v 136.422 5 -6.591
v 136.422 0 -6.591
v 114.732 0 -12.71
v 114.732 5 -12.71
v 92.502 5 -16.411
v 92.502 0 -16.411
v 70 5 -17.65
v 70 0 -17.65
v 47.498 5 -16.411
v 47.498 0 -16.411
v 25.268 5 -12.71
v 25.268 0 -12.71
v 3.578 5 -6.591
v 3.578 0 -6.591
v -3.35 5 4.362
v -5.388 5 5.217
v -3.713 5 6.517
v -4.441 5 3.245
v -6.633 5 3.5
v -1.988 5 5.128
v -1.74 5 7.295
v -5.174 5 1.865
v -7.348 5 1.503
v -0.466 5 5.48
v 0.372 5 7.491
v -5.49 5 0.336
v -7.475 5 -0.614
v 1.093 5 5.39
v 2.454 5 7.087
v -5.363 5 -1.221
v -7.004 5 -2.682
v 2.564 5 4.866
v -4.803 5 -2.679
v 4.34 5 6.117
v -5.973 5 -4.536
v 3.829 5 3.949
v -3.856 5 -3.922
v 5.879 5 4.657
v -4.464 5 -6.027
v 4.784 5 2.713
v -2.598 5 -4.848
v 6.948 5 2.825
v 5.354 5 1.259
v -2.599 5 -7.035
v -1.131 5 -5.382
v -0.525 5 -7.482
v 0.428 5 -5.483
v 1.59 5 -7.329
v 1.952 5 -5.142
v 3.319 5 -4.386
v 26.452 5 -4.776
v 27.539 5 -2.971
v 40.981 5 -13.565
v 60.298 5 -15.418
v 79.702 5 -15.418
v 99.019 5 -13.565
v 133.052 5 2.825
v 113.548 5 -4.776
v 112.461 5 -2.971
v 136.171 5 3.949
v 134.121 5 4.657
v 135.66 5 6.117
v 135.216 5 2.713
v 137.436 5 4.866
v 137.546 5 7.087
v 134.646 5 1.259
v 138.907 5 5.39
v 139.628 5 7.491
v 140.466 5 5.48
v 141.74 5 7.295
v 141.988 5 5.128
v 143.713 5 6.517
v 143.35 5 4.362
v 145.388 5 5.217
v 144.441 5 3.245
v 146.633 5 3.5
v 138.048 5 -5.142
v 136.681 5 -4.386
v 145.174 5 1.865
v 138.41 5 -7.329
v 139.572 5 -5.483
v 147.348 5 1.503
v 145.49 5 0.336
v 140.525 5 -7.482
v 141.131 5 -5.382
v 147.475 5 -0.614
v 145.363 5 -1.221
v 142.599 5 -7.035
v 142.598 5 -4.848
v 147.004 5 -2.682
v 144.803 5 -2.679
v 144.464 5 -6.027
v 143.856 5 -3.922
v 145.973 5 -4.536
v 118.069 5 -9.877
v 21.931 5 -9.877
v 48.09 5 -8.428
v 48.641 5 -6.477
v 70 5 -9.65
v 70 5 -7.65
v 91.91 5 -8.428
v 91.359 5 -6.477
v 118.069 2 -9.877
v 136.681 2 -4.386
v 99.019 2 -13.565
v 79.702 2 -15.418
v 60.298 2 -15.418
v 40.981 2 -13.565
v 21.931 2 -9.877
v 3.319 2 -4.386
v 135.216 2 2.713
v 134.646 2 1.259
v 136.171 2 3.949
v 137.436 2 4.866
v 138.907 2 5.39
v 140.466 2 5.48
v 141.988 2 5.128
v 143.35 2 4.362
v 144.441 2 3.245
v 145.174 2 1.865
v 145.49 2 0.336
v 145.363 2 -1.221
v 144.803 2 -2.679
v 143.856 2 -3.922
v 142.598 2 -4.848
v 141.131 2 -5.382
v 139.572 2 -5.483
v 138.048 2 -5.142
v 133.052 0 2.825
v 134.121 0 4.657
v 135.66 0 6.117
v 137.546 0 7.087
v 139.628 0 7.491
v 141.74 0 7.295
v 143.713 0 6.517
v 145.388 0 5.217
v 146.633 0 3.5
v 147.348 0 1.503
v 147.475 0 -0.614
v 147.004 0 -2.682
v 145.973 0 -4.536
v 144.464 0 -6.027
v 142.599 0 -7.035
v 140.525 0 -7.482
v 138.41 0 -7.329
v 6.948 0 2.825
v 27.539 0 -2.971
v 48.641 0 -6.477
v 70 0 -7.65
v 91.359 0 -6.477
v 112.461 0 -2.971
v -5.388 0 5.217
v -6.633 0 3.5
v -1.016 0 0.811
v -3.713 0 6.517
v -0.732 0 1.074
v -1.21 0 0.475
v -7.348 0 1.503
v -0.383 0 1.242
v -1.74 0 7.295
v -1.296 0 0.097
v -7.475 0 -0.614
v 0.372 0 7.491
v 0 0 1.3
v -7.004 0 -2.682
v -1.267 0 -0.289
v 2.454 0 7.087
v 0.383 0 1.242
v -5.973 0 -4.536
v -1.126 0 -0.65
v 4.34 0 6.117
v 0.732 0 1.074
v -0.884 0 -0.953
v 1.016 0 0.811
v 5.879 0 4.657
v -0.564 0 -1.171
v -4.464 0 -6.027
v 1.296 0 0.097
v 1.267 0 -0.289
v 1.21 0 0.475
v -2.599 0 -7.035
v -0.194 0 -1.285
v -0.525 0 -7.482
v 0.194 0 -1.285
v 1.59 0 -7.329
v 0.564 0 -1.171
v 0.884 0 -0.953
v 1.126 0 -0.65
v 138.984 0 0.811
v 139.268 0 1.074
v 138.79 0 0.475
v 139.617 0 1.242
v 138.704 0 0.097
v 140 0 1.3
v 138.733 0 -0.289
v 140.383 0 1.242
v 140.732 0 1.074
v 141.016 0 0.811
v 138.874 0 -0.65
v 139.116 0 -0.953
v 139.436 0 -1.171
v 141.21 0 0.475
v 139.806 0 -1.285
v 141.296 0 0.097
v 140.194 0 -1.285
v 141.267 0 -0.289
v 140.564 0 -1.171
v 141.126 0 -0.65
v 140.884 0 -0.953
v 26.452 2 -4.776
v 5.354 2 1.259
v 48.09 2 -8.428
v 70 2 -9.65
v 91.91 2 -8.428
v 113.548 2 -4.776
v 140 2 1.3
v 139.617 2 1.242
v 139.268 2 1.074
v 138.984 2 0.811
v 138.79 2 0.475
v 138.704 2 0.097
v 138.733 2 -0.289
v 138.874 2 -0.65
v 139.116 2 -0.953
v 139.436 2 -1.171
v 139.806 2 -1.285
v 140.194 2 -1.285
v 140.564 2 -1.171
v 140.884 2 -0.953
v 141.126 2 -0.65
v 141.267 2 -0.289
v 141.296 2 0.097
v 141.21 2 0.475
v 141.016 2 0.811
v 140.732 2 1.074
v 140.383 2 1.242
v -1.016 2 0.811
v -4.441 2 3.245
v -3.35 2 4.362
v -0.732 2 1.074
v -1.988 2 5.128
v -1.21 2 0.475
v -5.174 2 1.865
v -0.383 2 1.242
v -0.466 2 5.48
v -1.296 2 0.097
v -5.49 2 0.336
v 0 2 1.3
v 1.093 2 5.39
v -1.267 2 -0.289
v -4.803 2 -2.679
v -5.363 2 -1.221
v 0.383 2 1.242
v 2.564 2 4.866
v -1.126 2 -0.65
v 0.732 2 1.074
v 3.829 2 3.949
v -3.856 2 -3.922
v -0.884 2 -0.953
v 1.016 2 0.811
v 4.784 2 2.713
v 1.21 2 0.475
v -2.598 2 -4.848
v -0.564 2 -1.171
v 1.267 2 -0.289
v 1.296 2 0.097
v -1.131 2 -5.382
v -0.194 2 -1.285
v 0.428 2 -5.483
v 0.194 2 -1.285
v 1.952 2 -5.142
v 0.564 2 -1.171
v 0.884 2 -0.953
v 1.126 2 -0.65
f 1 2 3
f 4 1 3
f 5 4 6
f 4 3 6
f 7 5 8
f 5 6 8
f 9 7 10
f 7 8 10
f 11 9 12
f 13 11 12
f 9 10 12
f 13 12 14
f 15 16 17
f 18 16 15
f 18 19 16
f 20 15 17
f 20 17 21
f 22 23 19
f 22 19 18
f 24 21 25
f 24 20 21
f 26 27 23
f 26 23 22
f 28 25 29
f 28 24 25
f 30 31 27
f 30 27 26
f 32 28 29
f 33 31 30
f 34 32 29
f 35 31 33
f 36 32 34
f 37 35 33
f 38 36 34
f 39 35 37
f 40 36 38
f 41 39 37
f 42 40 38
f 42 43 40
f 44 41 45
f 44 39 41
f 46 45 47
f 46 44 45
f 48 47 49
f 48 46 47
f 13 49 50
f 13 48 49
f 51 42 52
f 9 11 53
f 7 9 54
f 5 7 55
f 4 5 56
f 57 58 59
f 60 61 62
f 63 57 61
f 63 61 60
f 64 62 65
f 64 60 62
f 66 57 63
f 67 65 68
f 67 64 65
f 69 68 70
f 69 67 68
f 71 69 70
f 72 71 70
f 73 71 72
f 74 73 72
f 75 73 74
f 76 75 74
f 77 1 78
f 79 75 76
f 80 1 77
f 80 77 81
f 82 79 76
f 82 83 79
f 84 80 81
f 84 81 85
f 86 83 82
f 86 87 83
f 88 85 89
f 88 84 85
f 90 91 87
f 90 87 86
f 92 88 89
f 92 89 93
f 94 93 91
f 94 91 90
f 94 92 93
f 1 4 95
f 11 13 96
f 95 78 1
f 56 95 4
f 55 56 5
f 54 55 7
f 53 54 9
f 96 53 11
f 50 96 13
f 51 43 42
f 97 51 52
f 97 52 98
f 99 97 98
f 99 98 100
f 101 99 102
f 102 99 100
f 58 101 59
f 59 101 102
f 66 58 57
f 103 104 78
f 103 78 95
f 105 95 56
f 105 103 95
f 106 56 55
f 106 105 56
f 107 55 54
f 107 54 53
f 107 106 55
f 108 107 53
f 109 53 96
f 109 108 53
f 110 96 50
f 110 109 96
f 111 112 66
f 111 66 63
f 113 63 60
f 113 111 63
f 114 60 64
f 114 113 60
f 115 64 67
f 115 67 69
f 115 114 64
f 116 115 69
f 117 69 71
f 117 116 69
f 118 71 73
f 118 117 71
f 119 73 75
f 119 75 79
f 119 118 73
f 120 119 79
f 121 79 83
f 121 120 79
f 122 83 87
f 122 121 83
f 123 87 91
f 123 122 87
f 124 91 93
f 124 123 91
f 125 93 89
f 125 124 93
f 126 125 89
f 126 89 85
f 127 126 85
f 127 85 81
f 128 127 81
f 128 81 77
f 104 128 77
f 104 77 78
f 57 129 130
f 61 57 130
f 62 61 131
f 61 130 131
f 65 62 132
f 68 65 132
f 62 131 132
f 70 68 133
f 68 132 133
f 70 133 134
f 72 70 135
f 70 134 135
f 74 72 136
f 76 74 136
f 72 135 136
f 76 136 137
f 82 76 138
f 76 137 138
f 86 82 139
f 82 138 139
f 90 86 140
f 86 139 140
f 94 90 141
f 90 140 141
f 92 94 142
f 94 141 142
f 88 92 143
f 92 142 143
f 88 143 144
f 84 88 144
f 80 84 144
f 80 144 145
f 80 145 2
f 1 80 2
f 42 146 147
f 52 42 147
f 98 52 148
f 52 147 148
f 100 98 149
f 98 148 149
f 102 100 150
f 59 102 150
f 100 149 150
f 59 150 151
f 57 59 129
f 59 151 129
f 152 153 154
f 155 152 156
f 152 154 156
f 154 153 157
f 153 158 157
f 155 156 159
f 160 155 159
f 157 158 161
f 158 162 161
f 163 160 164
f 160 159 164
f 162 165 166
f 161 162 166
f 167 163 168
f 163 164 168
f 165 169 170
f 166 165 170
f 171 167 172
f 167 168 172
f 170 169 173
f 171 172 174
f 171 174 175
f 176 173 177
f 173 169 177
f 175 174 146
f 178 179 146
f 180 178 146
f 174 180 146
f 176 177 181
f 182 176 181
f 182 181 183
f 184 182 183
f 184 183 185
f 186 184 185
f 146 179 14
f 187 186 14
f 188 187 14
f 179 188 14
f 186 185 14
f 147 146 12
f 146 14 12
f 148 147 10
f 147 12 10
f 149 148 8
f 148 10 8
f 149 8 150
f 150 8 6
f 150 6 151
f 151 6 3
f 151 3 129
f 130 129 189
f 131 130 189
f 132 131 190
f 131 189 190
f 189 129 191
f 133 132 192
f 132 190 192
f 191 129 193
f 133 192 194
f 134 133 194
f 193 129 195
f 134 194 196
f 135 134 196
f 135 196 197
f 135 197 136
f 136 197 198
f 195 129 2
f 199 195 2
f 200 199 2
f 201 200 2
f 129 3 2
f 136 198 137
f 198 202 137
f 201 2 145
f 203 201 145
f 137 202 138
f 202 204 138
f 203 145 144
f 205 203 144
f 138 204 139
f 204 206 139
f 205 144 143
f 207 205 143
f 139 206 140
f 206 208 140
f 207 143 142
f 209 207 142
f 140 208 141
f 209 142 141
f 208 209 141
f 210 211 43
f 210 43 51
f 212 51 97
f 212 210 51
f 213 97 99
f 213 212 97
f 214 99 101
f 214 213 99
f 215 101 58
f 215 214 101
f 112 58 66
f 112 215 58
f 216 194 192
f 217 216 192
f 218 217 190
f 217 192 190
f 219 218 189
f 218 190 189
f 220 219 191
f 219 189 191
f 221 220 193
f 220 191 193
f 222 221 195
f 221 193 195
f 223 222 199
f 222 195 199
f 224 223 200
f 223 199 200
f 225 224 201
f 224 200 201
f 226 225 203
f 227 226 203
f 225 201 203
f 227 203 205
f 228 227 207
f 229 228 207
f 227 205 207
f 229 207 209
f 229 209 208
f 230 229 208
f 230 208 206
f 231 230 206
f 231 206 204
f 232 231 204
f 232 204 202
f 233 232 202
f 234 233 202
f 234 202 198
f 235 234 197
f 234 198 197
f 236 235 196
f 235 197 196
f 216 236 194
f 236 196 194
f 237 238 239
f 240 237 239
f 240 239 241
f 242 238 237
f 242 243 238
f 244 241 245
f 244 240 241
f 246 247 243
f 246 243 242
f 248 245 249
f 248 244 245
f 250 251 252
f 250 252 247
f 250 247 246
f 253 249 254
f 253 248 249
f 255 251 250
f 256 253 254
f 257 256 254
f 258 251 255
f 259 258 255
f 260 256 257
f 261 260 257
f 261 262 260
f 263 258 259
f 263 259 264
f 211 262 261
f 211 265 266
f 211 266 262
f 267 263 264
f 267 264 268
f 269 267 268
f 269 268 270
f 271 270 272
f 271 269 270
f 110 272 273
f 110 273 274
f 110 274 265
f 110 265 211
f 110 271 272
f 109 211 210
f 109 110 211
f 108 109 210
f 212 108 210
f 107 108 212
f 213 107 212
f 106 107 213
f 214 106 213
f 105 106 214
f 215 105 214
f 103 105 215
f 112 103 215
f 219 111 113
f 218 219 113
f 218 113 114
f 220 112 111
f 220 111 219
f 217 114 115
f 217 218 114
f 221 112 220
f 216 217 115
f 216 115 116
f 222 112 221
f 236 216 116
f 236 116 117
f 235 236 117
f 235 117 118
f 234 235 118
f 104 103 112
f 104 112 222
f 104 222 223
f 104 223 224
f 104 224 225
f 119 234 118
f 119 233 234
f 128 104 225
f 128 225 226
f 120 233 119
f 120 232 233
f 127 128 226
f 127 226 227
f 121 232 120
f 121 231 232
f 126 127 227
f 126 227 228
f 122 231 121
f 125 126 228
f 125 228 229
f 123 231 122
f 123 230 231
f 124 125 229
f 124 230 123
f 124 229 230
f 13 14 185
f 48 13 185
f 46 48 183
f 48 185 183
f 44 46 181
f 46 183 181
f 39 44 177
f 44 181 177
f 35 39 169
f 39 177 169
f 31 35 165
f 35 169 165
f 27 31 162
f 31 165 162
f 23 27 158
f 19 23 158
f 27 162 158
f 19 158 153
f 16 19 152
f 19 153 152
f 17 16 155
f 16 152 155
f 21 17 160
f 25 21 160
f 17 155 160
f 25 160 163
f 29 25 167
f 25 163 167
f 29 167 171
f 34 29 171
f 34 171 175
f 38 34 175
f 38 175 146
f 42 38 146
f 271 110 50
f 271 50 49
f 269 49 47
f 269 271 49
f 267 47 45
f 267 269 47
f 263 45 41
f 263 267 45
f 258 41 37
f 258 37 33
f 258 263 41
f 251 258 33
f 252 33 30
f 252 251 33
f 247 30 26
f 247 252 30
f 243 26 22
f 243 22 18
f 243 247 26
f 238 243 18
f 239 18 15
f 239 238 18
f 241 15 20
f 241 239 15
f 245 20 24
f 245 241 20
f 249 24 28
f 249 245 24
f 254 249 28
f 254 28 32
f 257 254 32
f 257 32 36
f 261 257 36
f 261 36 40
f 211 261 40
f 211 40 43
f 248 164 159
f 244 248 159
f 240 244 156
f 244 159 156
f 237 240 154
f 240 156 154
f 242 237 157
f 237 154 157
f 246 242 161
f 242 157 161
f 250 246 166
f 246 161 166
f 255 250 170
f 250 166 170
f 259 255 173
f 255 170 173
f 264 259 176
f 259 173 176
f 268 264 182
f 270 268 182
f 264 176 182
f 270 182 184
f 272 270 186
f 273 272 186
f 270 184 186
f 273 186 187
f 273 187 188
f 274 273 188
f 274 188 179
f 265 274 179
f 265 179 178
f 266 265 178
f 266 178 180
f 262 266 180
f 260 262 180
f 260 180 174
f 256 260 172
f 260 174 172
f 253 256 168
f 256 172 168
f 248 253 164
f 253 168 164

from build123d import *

# Parameters (mm, degrees)
DODANIE_WYCI_GNI_CIE2_DEPTH  = 5
SKORUPA2_START               = 2
SKORUPA2_DEPTH               = 3
SZKIC5_W                     = 1.3
SZKIC5_H                     = 2.001
OTW_R_POD_RUB_M22_AT_2_COUNT = 2
OTW_R_POD_RUB_M22_AT_2_PITCH = 140


# Read off the part's stored shape, not the designer's step: Skorupa2
with BuildPart() as part:
    # Szkic4 → Dodanie-wyciągnięcie2 (new body)
    with BuildSketch(Plane(origin=(0, 0, 0), x_dir=(1, 0, 0), z_dir=(0, 1, 0))):
        with BuildLine():
            ThreePointArc((3.578481933, 6.591241693), (-7.061624869, -2.526549863), (6.947544161, -2.825177894))
            ThreePointArc((6.947544161, -2.825177894), (70, 7.650060048), (133.052455839, -2.825177894))
            ThreePointArc((133.052455839, -2.825177894), (147.061624869, -2.526549863), (136.421518067, 6.591241693))
            ThreePointArc((136.421518067, 6.591241693), (70, 17.650060048), (3.578481933, 6.591241693))
        make_face()
    extrude(amount=DODANIE_WYCI_GNI_CIE2_DEPTH)

    # Skorupa2 outline → Skorupa2 (cut)
    with BuildSketch(Plane(origin=(0, 0, 0), x_dir=(1, 0, 0), z_dir=(0, 1, 0)).offset(SKORUPA2_START)):
        with BuildLine():
            ThreePointArc((3.318777837, 4.385853813), (-5.173966338, -1.865495198), (5.353998671, -1.258847978))
            ThreePointArc((5.353998671, -1.258847978), (70, 9.650060048), (134.646001329, -1.258847978))
            ThreePointArc((134.646001329, -1.258847978), (145.173966338, -1.865495198), (136.681222163, 4.385853813))
            ThreePointArc((136.681222163, 4.385853813), (70, 15.650060048), (3.318777837, 4.385853813))
        make_face()
    extrude(amount=SKORUPA2_DEPTH, mode=Mode.SUBTRACT)

    # Szkic5 → Otwór pod śrubę M22 (revolve, cut)
    with BuildSketch(Plane(origin=(0, 2, 0), x_dir=(0, 0, 1), z_dir=(1, 0, 0))):
        with Locations((0.65, 1.0005)):
            Rectangle(SZKIC5_W, SZKIC5_H)
    otw_r_pod_rub_m22 = revolve(axis=Axis((0, 8.35, 0), (0, -1, 0)), mode=Mode.SUBTRACT)

    # Otwór pod śrubę M22 at 2: Otwór pod śrubę M22 ×2
    with Locations(*[(i * OTW_R_POD_RUB_M22_AT_2_PITCH, 0, 0) for i in range(1, OTW_R_POD_RUB_M22_AT_2_COUNT)]):
        add(otw_r_pod_rub_m22, mode=Mode.SUBTRACT)


solid = part.part
